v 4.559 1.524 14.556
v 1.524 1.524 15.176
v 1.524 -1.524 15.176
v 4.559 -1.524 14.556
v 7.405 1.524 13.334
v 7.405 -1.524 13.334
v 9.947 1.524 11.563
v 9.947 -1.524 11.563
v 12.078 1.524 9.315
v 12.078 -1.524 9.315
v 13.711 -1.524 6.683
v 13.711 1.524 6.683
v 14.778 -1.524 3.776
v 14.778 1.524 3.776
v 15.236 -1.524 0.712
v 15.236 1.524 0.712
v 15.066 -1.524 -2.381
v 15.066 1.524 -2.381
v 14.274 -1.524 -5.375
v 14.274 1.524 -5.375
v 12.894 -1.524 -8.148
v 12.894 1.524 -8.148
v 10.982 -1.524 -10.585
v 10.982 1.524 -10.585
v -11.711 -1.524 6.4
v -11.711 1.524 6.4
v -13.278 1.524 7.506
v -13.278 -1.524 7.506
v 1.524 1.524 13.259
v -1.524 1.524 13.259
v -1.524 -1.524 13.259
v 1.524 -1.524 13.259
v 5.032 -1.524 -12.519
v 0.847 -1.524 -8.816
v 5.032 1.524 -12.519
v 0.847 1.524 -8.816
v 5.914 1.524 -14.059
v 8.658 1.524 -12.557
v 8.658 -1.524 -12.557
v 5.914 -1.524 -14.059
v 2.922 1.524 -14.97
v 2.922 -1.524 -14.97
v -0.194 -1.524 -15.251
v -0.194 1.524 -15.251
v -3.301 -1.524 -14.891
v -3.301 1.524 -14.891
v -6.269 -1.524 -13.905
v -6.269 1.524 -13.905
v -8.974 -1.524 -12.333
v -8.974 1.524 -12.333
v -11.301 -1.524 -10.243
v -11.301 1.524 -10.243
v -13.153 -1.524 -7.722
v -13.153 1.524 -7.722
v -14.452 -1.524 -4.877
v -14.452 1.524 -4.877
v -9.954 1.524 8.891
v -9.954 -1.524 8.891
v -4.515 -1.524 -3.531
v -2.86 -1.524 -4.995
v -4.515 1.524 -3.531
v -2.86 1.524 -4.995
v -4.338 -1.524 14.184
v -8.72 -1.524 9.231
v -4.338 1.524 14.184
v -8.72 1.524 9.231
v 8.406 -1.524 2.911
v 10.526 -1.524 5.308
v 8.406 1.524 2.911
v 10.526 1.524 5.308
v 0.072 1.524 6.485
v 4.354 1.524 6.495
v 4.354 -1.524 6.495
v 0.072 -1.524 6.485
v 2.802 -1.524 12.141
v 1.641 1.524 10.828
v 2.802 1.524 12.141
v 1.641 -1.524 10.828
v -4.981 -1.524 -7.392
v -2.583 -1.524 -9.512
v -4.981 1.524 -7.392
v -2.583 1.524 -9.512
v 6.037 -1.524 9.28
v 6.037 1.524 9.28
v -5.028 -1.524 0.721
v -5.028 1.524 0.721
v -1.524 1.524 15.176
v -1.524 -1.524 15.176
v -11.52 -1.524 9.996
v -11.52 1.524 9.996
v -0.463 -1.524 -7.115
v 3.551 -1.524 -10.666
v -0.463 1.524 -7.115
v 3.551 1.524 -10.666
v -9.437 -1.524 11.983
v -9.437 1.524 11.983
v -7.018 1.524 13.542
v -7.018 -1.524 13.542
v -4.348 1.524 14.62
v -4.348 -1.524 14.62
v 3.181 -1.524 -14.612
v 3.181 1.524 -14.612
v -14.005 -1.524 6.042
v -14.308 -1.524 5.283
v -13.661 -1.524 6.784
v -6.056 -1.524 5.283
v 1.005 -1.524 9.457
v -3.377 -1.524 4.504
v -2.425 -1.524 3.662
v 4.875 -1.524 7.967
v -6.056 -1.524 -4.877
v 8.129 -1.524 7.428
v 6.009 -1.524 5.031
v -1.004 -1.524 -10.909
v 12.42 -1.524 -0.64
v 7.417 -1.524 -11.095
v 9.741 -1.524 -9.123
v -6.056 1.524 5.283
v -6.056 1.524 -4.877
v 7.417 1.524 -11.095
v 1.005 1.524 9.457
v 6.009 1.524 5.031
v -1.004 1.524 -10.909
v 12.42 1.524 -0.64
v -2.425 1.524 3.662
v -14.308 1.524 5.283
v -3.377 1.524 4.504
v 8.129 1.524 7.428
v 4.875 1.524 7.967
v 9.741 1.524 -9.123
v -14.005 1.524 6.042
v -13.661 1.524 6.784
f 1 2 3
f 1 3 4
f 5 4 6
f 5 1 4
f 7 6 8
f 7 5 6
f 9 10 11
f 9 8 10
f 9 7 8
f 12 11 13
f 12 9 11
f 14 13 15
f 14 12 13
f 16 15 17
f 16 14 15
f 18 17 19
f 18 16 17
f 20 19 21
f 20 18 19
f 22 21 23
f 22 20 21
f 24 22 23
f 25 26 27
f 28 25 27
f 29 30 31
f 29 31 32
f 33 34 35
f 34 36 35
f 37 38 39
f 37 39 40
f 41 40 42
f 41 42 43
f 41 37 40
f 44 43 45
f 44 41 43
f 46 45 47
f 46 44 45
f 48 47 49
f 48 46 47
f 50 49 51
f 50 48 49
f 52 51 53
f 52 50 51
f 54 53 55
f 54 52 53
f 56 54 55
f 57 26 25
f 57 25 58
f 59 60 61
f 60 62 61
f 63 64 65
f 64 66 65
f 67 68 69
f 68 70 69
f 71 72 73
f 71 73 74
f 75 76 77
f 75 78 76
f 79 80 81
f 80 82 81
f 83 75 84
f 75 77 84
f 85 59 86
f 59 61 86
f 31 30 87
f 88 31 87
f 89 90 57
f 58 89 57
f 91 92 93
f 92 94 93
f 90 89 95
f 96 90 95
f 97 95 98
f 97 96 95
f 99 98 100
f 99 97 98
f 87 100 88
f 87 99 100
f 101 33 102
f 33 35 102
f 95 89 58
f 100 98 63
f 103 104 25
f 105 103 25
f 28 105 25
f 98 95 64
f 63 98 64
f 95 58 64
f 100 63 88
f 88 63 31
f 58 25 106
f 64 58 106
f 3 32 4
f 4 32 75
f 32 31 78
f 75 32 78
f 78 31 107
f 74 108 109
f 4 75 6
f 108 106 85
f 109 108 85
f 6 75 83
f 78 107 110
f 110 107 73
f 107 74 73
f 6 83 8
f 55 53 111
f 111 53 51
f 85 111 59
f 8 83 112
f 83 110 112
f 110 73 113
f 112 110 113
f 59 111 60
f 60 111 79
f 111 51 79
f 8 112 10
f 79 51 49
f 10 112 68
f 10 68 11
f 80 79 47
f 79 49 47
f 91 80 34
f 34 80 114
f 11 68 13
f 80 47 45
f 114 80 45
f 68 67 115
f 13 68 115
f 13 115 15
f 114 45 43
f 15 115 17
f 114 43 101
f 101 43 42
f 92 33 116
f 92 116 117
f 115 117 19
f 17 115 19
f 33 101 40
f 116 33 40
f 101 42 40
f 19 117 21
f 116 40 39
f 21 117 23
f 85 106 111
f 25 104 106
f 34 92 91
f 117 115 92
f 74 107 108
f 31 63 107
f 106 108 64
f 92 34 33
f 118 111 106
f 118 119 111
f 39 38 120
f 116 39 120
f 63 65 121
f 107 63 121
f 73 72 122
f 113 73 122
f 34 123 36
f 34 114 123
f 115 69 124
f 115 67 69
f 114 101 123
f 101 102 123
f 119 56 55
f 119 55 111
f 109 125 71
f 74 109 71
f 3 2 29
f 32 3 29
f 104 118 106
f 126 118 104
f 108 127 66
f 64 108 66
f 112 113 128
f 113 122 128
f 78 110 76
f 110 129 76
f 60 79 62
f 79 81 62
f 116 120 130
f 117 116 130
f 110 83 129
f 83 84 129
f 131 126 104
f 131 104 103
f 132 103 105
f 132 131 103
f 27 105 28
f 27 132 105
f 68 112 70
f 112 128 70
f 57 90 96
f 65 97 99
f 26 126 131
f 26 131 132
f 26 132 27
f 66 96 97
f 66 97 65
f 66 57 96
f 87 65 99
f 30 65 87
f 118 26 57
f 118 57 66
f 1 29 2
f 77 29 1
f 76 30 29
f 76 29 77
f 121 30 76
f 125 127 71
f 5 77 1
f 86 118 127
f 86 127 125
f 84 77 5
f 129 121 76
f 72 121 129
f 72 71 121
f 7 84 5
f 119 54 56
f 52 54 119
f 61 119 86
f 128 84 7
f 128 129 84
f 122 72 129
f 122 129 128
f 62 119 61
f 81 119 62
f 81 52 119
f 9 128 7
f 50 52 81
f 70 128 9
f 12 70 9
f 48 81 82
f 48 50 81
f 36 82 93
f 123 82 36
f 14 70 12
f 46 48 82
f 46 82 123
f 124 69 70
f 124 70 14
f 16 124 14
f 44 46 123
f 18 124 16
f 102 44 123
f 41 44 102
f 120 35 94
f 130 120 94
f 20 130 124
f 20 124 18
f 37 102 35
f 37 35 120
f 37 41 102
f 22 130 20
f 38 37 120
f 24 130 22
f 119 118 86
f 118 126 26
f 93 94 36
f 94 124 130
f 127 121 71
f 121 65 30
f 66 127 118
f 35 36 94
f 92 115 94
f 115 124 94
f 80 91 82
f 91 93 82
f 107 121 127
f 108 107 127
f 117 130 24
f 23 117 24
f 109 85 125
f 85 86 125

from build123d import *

# Parameters (mm, degrees)
SKETCH1_R           = 1.143
BOSS_EXTRUDE1_DEPTH = 1.524
SKETCH2_R           = 1.524
SKETCH2_R_2         = 1.143
CUT_EXTRUDE1_DEPTH  = 25.96925768
SKETCH4_R           = 20.695463349
SKETCH4_R_2         = 15.2527
CUT_EXTRUDE2_DEPTH  = 25.96925768
BOSS_EXTRUDE2_DEPTH = 3.048
BOSS_EXTRUDE3_DEPTH = 3.048


with BuildPart() as part:
    # Sketch1 → Boss-Extrude1 (new, symmetric)
    with BuildSketch(Plane(origin=(0, 0, 0), x_dir=(1, 0, 0), z_dir=(0, 1, 0))):
        with BuildLine():
            ThreePointArc((-17.060660873, -5.2832), (-0.126583546, -17.859516463), (16.984058744, -5.5245))
            Line((16.984058744, -5.5245), (16.984058744, 5.5245))
            ThreePointArc((16.984058744, 5.5245), (-0.338525345, 17.856756488), (-17.181244816, 4.8768))
            Line((-17.181244816, 4.8768), (-6.056265338, 4.8768))
            Line((-6.056265338, 4.8768), (-6.056265338, -5.2832))
            Line((-6.056265338, -5.2832), (-17.060660873, -5.2832))
        make_face()
        with Locations(Location((8.579035657, 10.1092, 0), (0, 0, 90))):
            Circle(SKETCH1_R, mode=Mode.SUBTRACT)
        with Locations(Location((0, -13.2588, 0), (0, 0, 90))):
            Circle(SKETCH1_R, mode=Mode.SUBTRACT)
        with Locations(Location((-10.832526773, -7.6454, 0), (0, 0, 90))):
            Circle(SKETCH1_R, mode=Mode.SUBTRACT)
        Polygon((6.036511594, -9.279669889), (4.875306175, -7.966959435), (1.641092014, -10.827900322), (2.802297432, -12.140610776), align=None, mode=Mode.SUBTRACT)
        Polygon((-5.027565338, -0.720652536), (-2.425370717, -3.662361234), (-8.720293025, -9.230761998), (-4.338426069, -14.184340812), (6.008776335, -5.031349407), (8.129238404, -7.428472845), (10.526361842, -5.308010776), (8.405899773, -2.910887338), (12.420130291, 0.640045174), (3.551213542, 10.666109075), (-0.463016976, 7.115176563), (-2.583479045, 9.5123), (-4.980602482, 7.391837931), (-2.860140414, 4.994714494), (-4.515281158, 3.5306), align=None, mode=Mode.SUBTRACT)
        Polygon((0.846775502, 8.816385505), (5.032229122, 12.518779594), (3.181032078, 14.611506404), (-1.004421543, 10.909112315), align=None, mode=Mode.SUBTRACT)
    extrude(amount=BOSS_EXTRUDE1_DEPTH, both=True)

    # Sketch2 → Cut-Extrude1 (cut, through all)
    # profile 1 of 6: a face of its own
    with BuildSketch(Plane(origin=(0, 1.524, 0), x_dir=(1, 0, 0), z_dir=(0, 1, 0))):
        with Locations((-10.832526773, -7.6454)):
            Circle(SKETCH2_R)
        with Locations((-10.832526773, -7.6454)):
            Circle(SKETCH2_R_2, mode=Mode.SUBTRACT)
    # profile 2 of 6: a face of its own
    with BuildSketch(Plane(origin=(0, 1.524, 0), x_dir=(1, 0, 0), z_dir=(0, 1, 0))):
        with BuildLine():
            ThreePointArc((-15.417270145, -9.015882261), (-14.591708872, -10.298562224), (-13.659706927, -11.506118301))
            Line((-13.659706927, -11.506118301), (-9.953745163, -8.89051802))
            ThreePointArc((-9.953745163, -8.89051802), (-12.077644792, -8.524181609), (-11.711308382, -6.40028198))
            Line((-11.711308382, -6.40028198), (-15.417270145, -9.015882261))
        make_face()
    # profile 3 of 6: a face of its own
    with BuildSketch(Plane(origin=(0, 1.524, 0), x_dir=(1, 0, 0), z_dir=(0, 1, 0))):
        with BuildLine():
            ThreePointArc((1.524, -13.2588), (0, -14.7828), (-1.524, -13.2588))
            Line((-1.524, -13.2588), (-1.524, -17.794824407))
            ThreePointArc((-1.524, -17.794824407), (0, -17.859965052), (1.524, -17.794824407))
            Line((1.524, -17.794824407), (1.524, -13.2588))
        make_face()
    # profile 4 of 6: a face of its own
    with BuildSketch(Plane(origin=(0, 1.524, 0), x_dir=(1, 0, 0), z_dir=(0, 1, 0))):
        with Locations((0, -13.2588)):
            Circle(SKETCH2_R)
        with Locations((0, -13.2588)):
            Circle(SKETCH2_R_2, mode=Mode.SUBTRACT)
    # profile 5 of 6: a face of its own
    with BuildSketch(Plane(origin=(0, 1.524, 0), x_dir=(1, 0, 0), z_dir=(0, 1, 0))):
        with BuildLine():
            Line((10.352068988, 14.55379742), (7.417058645, 11.095296053))
            ThreePointArc((7.417058645, 11.095296053), (9.104260863, 11.539834294), (10.103035657, 10.1092))
            ThreePointArc((10.103035657, 10.1092), (10.009669951, 9.583974794), (9.741012668, 9.123103947))
            Line((9.741012668, 9.123103947), (12.676023011, 12.581605315))
            ThreePointArc((12.676023011, 12.581605315), (11.556194906, 13.61736799), (10.352068988, 14.55379742))
        make_face()
    # profile 6 of 6: a face of its own
    with BuildSketch(Plane(origin=(0, 1.524, 0), x_dir=(1, 0, 0), z_dir=(0, 1, 0))):
        with Locations((8.579035657, 10.1092)):
            Circle(SKETCH2_R)
        with Locations((8.579035657, 10.1092)):
            Circle(SKETCH2_R_2, mode=Mode.SUBTRACT)
    extrude(amount=-CUT_EXTRUDE1_DEPTH, mode=Mode.SUBTRACT)

    # Sketch4 → Cut-Extrude2 (cut, through all)
    with BuildSketch(Plane(origin=(0, 1.524, 0), x_dir=(1, 0, 0), z_dir=(0, 1, 0))):
        Circle(SKETCH4_R)
        Circle(SKETCH4_R_2, mode=Mode.SUBTRACT)
    extrude(amount=-CUT_EXTRUDE2_DEPTH, mode=Mode.SUBTRACT)

    # Sketch5 → Boss-Extrude2 (add)
    with BuildSketch(Plane(origin=(0, 1.524, 0), x_dir=(1, 0, 0), z_dir=(0, 1, 0))):
        Polygon((-2.425370717, -3.662361234), (1.956496239, -8.615940048), (1.005256779, -9.45739325), (-3.376610176, -4.503814436), align=None)
    extrude(amount=-BOSS_EXTRUDE2_DEPTH)

    # Sketch6 → Boss-Extrude3 (add)
    with BuildSketch(Plane(origin=(0, 1.524, 0), x_dir=(1, 0, 0), z_dir=(0, 1, 0))):
        with BuildLine():
            Line((-11.711308382, -6.40028198), (-9.953745163, -8.89051802))
            ThreePointArc((-9.953745163, -8.89051802), (-9.587408753, -6.766618391), (-11.711308382, -6.40028198))
        make_face()
        with BuildLine():
            Line((-1.524, -13.2588), (1.524, -13.2588))
            ThreePointArc((1.524, -13.2588), (0, -11.7348), (-1.524, -13.2588))
        make_face()
        with BuildLine():
            Line((7.417058645, 11.095296053), (9.741012668, 9.123103947))
            ThreePointArc((9.741012668, 9.123103947), (7.592939604, 8.947222989), (7.417058645, 11.095296053))
        make_face()
        Polygon((4.353635591, -6.495463901), (0.071641066, -6.485163659), (1.956496239, -8.615940048), align=None)
    extrude(amount=-BOSS_EXTRUDE3_DEPTH)


solid = part.part
